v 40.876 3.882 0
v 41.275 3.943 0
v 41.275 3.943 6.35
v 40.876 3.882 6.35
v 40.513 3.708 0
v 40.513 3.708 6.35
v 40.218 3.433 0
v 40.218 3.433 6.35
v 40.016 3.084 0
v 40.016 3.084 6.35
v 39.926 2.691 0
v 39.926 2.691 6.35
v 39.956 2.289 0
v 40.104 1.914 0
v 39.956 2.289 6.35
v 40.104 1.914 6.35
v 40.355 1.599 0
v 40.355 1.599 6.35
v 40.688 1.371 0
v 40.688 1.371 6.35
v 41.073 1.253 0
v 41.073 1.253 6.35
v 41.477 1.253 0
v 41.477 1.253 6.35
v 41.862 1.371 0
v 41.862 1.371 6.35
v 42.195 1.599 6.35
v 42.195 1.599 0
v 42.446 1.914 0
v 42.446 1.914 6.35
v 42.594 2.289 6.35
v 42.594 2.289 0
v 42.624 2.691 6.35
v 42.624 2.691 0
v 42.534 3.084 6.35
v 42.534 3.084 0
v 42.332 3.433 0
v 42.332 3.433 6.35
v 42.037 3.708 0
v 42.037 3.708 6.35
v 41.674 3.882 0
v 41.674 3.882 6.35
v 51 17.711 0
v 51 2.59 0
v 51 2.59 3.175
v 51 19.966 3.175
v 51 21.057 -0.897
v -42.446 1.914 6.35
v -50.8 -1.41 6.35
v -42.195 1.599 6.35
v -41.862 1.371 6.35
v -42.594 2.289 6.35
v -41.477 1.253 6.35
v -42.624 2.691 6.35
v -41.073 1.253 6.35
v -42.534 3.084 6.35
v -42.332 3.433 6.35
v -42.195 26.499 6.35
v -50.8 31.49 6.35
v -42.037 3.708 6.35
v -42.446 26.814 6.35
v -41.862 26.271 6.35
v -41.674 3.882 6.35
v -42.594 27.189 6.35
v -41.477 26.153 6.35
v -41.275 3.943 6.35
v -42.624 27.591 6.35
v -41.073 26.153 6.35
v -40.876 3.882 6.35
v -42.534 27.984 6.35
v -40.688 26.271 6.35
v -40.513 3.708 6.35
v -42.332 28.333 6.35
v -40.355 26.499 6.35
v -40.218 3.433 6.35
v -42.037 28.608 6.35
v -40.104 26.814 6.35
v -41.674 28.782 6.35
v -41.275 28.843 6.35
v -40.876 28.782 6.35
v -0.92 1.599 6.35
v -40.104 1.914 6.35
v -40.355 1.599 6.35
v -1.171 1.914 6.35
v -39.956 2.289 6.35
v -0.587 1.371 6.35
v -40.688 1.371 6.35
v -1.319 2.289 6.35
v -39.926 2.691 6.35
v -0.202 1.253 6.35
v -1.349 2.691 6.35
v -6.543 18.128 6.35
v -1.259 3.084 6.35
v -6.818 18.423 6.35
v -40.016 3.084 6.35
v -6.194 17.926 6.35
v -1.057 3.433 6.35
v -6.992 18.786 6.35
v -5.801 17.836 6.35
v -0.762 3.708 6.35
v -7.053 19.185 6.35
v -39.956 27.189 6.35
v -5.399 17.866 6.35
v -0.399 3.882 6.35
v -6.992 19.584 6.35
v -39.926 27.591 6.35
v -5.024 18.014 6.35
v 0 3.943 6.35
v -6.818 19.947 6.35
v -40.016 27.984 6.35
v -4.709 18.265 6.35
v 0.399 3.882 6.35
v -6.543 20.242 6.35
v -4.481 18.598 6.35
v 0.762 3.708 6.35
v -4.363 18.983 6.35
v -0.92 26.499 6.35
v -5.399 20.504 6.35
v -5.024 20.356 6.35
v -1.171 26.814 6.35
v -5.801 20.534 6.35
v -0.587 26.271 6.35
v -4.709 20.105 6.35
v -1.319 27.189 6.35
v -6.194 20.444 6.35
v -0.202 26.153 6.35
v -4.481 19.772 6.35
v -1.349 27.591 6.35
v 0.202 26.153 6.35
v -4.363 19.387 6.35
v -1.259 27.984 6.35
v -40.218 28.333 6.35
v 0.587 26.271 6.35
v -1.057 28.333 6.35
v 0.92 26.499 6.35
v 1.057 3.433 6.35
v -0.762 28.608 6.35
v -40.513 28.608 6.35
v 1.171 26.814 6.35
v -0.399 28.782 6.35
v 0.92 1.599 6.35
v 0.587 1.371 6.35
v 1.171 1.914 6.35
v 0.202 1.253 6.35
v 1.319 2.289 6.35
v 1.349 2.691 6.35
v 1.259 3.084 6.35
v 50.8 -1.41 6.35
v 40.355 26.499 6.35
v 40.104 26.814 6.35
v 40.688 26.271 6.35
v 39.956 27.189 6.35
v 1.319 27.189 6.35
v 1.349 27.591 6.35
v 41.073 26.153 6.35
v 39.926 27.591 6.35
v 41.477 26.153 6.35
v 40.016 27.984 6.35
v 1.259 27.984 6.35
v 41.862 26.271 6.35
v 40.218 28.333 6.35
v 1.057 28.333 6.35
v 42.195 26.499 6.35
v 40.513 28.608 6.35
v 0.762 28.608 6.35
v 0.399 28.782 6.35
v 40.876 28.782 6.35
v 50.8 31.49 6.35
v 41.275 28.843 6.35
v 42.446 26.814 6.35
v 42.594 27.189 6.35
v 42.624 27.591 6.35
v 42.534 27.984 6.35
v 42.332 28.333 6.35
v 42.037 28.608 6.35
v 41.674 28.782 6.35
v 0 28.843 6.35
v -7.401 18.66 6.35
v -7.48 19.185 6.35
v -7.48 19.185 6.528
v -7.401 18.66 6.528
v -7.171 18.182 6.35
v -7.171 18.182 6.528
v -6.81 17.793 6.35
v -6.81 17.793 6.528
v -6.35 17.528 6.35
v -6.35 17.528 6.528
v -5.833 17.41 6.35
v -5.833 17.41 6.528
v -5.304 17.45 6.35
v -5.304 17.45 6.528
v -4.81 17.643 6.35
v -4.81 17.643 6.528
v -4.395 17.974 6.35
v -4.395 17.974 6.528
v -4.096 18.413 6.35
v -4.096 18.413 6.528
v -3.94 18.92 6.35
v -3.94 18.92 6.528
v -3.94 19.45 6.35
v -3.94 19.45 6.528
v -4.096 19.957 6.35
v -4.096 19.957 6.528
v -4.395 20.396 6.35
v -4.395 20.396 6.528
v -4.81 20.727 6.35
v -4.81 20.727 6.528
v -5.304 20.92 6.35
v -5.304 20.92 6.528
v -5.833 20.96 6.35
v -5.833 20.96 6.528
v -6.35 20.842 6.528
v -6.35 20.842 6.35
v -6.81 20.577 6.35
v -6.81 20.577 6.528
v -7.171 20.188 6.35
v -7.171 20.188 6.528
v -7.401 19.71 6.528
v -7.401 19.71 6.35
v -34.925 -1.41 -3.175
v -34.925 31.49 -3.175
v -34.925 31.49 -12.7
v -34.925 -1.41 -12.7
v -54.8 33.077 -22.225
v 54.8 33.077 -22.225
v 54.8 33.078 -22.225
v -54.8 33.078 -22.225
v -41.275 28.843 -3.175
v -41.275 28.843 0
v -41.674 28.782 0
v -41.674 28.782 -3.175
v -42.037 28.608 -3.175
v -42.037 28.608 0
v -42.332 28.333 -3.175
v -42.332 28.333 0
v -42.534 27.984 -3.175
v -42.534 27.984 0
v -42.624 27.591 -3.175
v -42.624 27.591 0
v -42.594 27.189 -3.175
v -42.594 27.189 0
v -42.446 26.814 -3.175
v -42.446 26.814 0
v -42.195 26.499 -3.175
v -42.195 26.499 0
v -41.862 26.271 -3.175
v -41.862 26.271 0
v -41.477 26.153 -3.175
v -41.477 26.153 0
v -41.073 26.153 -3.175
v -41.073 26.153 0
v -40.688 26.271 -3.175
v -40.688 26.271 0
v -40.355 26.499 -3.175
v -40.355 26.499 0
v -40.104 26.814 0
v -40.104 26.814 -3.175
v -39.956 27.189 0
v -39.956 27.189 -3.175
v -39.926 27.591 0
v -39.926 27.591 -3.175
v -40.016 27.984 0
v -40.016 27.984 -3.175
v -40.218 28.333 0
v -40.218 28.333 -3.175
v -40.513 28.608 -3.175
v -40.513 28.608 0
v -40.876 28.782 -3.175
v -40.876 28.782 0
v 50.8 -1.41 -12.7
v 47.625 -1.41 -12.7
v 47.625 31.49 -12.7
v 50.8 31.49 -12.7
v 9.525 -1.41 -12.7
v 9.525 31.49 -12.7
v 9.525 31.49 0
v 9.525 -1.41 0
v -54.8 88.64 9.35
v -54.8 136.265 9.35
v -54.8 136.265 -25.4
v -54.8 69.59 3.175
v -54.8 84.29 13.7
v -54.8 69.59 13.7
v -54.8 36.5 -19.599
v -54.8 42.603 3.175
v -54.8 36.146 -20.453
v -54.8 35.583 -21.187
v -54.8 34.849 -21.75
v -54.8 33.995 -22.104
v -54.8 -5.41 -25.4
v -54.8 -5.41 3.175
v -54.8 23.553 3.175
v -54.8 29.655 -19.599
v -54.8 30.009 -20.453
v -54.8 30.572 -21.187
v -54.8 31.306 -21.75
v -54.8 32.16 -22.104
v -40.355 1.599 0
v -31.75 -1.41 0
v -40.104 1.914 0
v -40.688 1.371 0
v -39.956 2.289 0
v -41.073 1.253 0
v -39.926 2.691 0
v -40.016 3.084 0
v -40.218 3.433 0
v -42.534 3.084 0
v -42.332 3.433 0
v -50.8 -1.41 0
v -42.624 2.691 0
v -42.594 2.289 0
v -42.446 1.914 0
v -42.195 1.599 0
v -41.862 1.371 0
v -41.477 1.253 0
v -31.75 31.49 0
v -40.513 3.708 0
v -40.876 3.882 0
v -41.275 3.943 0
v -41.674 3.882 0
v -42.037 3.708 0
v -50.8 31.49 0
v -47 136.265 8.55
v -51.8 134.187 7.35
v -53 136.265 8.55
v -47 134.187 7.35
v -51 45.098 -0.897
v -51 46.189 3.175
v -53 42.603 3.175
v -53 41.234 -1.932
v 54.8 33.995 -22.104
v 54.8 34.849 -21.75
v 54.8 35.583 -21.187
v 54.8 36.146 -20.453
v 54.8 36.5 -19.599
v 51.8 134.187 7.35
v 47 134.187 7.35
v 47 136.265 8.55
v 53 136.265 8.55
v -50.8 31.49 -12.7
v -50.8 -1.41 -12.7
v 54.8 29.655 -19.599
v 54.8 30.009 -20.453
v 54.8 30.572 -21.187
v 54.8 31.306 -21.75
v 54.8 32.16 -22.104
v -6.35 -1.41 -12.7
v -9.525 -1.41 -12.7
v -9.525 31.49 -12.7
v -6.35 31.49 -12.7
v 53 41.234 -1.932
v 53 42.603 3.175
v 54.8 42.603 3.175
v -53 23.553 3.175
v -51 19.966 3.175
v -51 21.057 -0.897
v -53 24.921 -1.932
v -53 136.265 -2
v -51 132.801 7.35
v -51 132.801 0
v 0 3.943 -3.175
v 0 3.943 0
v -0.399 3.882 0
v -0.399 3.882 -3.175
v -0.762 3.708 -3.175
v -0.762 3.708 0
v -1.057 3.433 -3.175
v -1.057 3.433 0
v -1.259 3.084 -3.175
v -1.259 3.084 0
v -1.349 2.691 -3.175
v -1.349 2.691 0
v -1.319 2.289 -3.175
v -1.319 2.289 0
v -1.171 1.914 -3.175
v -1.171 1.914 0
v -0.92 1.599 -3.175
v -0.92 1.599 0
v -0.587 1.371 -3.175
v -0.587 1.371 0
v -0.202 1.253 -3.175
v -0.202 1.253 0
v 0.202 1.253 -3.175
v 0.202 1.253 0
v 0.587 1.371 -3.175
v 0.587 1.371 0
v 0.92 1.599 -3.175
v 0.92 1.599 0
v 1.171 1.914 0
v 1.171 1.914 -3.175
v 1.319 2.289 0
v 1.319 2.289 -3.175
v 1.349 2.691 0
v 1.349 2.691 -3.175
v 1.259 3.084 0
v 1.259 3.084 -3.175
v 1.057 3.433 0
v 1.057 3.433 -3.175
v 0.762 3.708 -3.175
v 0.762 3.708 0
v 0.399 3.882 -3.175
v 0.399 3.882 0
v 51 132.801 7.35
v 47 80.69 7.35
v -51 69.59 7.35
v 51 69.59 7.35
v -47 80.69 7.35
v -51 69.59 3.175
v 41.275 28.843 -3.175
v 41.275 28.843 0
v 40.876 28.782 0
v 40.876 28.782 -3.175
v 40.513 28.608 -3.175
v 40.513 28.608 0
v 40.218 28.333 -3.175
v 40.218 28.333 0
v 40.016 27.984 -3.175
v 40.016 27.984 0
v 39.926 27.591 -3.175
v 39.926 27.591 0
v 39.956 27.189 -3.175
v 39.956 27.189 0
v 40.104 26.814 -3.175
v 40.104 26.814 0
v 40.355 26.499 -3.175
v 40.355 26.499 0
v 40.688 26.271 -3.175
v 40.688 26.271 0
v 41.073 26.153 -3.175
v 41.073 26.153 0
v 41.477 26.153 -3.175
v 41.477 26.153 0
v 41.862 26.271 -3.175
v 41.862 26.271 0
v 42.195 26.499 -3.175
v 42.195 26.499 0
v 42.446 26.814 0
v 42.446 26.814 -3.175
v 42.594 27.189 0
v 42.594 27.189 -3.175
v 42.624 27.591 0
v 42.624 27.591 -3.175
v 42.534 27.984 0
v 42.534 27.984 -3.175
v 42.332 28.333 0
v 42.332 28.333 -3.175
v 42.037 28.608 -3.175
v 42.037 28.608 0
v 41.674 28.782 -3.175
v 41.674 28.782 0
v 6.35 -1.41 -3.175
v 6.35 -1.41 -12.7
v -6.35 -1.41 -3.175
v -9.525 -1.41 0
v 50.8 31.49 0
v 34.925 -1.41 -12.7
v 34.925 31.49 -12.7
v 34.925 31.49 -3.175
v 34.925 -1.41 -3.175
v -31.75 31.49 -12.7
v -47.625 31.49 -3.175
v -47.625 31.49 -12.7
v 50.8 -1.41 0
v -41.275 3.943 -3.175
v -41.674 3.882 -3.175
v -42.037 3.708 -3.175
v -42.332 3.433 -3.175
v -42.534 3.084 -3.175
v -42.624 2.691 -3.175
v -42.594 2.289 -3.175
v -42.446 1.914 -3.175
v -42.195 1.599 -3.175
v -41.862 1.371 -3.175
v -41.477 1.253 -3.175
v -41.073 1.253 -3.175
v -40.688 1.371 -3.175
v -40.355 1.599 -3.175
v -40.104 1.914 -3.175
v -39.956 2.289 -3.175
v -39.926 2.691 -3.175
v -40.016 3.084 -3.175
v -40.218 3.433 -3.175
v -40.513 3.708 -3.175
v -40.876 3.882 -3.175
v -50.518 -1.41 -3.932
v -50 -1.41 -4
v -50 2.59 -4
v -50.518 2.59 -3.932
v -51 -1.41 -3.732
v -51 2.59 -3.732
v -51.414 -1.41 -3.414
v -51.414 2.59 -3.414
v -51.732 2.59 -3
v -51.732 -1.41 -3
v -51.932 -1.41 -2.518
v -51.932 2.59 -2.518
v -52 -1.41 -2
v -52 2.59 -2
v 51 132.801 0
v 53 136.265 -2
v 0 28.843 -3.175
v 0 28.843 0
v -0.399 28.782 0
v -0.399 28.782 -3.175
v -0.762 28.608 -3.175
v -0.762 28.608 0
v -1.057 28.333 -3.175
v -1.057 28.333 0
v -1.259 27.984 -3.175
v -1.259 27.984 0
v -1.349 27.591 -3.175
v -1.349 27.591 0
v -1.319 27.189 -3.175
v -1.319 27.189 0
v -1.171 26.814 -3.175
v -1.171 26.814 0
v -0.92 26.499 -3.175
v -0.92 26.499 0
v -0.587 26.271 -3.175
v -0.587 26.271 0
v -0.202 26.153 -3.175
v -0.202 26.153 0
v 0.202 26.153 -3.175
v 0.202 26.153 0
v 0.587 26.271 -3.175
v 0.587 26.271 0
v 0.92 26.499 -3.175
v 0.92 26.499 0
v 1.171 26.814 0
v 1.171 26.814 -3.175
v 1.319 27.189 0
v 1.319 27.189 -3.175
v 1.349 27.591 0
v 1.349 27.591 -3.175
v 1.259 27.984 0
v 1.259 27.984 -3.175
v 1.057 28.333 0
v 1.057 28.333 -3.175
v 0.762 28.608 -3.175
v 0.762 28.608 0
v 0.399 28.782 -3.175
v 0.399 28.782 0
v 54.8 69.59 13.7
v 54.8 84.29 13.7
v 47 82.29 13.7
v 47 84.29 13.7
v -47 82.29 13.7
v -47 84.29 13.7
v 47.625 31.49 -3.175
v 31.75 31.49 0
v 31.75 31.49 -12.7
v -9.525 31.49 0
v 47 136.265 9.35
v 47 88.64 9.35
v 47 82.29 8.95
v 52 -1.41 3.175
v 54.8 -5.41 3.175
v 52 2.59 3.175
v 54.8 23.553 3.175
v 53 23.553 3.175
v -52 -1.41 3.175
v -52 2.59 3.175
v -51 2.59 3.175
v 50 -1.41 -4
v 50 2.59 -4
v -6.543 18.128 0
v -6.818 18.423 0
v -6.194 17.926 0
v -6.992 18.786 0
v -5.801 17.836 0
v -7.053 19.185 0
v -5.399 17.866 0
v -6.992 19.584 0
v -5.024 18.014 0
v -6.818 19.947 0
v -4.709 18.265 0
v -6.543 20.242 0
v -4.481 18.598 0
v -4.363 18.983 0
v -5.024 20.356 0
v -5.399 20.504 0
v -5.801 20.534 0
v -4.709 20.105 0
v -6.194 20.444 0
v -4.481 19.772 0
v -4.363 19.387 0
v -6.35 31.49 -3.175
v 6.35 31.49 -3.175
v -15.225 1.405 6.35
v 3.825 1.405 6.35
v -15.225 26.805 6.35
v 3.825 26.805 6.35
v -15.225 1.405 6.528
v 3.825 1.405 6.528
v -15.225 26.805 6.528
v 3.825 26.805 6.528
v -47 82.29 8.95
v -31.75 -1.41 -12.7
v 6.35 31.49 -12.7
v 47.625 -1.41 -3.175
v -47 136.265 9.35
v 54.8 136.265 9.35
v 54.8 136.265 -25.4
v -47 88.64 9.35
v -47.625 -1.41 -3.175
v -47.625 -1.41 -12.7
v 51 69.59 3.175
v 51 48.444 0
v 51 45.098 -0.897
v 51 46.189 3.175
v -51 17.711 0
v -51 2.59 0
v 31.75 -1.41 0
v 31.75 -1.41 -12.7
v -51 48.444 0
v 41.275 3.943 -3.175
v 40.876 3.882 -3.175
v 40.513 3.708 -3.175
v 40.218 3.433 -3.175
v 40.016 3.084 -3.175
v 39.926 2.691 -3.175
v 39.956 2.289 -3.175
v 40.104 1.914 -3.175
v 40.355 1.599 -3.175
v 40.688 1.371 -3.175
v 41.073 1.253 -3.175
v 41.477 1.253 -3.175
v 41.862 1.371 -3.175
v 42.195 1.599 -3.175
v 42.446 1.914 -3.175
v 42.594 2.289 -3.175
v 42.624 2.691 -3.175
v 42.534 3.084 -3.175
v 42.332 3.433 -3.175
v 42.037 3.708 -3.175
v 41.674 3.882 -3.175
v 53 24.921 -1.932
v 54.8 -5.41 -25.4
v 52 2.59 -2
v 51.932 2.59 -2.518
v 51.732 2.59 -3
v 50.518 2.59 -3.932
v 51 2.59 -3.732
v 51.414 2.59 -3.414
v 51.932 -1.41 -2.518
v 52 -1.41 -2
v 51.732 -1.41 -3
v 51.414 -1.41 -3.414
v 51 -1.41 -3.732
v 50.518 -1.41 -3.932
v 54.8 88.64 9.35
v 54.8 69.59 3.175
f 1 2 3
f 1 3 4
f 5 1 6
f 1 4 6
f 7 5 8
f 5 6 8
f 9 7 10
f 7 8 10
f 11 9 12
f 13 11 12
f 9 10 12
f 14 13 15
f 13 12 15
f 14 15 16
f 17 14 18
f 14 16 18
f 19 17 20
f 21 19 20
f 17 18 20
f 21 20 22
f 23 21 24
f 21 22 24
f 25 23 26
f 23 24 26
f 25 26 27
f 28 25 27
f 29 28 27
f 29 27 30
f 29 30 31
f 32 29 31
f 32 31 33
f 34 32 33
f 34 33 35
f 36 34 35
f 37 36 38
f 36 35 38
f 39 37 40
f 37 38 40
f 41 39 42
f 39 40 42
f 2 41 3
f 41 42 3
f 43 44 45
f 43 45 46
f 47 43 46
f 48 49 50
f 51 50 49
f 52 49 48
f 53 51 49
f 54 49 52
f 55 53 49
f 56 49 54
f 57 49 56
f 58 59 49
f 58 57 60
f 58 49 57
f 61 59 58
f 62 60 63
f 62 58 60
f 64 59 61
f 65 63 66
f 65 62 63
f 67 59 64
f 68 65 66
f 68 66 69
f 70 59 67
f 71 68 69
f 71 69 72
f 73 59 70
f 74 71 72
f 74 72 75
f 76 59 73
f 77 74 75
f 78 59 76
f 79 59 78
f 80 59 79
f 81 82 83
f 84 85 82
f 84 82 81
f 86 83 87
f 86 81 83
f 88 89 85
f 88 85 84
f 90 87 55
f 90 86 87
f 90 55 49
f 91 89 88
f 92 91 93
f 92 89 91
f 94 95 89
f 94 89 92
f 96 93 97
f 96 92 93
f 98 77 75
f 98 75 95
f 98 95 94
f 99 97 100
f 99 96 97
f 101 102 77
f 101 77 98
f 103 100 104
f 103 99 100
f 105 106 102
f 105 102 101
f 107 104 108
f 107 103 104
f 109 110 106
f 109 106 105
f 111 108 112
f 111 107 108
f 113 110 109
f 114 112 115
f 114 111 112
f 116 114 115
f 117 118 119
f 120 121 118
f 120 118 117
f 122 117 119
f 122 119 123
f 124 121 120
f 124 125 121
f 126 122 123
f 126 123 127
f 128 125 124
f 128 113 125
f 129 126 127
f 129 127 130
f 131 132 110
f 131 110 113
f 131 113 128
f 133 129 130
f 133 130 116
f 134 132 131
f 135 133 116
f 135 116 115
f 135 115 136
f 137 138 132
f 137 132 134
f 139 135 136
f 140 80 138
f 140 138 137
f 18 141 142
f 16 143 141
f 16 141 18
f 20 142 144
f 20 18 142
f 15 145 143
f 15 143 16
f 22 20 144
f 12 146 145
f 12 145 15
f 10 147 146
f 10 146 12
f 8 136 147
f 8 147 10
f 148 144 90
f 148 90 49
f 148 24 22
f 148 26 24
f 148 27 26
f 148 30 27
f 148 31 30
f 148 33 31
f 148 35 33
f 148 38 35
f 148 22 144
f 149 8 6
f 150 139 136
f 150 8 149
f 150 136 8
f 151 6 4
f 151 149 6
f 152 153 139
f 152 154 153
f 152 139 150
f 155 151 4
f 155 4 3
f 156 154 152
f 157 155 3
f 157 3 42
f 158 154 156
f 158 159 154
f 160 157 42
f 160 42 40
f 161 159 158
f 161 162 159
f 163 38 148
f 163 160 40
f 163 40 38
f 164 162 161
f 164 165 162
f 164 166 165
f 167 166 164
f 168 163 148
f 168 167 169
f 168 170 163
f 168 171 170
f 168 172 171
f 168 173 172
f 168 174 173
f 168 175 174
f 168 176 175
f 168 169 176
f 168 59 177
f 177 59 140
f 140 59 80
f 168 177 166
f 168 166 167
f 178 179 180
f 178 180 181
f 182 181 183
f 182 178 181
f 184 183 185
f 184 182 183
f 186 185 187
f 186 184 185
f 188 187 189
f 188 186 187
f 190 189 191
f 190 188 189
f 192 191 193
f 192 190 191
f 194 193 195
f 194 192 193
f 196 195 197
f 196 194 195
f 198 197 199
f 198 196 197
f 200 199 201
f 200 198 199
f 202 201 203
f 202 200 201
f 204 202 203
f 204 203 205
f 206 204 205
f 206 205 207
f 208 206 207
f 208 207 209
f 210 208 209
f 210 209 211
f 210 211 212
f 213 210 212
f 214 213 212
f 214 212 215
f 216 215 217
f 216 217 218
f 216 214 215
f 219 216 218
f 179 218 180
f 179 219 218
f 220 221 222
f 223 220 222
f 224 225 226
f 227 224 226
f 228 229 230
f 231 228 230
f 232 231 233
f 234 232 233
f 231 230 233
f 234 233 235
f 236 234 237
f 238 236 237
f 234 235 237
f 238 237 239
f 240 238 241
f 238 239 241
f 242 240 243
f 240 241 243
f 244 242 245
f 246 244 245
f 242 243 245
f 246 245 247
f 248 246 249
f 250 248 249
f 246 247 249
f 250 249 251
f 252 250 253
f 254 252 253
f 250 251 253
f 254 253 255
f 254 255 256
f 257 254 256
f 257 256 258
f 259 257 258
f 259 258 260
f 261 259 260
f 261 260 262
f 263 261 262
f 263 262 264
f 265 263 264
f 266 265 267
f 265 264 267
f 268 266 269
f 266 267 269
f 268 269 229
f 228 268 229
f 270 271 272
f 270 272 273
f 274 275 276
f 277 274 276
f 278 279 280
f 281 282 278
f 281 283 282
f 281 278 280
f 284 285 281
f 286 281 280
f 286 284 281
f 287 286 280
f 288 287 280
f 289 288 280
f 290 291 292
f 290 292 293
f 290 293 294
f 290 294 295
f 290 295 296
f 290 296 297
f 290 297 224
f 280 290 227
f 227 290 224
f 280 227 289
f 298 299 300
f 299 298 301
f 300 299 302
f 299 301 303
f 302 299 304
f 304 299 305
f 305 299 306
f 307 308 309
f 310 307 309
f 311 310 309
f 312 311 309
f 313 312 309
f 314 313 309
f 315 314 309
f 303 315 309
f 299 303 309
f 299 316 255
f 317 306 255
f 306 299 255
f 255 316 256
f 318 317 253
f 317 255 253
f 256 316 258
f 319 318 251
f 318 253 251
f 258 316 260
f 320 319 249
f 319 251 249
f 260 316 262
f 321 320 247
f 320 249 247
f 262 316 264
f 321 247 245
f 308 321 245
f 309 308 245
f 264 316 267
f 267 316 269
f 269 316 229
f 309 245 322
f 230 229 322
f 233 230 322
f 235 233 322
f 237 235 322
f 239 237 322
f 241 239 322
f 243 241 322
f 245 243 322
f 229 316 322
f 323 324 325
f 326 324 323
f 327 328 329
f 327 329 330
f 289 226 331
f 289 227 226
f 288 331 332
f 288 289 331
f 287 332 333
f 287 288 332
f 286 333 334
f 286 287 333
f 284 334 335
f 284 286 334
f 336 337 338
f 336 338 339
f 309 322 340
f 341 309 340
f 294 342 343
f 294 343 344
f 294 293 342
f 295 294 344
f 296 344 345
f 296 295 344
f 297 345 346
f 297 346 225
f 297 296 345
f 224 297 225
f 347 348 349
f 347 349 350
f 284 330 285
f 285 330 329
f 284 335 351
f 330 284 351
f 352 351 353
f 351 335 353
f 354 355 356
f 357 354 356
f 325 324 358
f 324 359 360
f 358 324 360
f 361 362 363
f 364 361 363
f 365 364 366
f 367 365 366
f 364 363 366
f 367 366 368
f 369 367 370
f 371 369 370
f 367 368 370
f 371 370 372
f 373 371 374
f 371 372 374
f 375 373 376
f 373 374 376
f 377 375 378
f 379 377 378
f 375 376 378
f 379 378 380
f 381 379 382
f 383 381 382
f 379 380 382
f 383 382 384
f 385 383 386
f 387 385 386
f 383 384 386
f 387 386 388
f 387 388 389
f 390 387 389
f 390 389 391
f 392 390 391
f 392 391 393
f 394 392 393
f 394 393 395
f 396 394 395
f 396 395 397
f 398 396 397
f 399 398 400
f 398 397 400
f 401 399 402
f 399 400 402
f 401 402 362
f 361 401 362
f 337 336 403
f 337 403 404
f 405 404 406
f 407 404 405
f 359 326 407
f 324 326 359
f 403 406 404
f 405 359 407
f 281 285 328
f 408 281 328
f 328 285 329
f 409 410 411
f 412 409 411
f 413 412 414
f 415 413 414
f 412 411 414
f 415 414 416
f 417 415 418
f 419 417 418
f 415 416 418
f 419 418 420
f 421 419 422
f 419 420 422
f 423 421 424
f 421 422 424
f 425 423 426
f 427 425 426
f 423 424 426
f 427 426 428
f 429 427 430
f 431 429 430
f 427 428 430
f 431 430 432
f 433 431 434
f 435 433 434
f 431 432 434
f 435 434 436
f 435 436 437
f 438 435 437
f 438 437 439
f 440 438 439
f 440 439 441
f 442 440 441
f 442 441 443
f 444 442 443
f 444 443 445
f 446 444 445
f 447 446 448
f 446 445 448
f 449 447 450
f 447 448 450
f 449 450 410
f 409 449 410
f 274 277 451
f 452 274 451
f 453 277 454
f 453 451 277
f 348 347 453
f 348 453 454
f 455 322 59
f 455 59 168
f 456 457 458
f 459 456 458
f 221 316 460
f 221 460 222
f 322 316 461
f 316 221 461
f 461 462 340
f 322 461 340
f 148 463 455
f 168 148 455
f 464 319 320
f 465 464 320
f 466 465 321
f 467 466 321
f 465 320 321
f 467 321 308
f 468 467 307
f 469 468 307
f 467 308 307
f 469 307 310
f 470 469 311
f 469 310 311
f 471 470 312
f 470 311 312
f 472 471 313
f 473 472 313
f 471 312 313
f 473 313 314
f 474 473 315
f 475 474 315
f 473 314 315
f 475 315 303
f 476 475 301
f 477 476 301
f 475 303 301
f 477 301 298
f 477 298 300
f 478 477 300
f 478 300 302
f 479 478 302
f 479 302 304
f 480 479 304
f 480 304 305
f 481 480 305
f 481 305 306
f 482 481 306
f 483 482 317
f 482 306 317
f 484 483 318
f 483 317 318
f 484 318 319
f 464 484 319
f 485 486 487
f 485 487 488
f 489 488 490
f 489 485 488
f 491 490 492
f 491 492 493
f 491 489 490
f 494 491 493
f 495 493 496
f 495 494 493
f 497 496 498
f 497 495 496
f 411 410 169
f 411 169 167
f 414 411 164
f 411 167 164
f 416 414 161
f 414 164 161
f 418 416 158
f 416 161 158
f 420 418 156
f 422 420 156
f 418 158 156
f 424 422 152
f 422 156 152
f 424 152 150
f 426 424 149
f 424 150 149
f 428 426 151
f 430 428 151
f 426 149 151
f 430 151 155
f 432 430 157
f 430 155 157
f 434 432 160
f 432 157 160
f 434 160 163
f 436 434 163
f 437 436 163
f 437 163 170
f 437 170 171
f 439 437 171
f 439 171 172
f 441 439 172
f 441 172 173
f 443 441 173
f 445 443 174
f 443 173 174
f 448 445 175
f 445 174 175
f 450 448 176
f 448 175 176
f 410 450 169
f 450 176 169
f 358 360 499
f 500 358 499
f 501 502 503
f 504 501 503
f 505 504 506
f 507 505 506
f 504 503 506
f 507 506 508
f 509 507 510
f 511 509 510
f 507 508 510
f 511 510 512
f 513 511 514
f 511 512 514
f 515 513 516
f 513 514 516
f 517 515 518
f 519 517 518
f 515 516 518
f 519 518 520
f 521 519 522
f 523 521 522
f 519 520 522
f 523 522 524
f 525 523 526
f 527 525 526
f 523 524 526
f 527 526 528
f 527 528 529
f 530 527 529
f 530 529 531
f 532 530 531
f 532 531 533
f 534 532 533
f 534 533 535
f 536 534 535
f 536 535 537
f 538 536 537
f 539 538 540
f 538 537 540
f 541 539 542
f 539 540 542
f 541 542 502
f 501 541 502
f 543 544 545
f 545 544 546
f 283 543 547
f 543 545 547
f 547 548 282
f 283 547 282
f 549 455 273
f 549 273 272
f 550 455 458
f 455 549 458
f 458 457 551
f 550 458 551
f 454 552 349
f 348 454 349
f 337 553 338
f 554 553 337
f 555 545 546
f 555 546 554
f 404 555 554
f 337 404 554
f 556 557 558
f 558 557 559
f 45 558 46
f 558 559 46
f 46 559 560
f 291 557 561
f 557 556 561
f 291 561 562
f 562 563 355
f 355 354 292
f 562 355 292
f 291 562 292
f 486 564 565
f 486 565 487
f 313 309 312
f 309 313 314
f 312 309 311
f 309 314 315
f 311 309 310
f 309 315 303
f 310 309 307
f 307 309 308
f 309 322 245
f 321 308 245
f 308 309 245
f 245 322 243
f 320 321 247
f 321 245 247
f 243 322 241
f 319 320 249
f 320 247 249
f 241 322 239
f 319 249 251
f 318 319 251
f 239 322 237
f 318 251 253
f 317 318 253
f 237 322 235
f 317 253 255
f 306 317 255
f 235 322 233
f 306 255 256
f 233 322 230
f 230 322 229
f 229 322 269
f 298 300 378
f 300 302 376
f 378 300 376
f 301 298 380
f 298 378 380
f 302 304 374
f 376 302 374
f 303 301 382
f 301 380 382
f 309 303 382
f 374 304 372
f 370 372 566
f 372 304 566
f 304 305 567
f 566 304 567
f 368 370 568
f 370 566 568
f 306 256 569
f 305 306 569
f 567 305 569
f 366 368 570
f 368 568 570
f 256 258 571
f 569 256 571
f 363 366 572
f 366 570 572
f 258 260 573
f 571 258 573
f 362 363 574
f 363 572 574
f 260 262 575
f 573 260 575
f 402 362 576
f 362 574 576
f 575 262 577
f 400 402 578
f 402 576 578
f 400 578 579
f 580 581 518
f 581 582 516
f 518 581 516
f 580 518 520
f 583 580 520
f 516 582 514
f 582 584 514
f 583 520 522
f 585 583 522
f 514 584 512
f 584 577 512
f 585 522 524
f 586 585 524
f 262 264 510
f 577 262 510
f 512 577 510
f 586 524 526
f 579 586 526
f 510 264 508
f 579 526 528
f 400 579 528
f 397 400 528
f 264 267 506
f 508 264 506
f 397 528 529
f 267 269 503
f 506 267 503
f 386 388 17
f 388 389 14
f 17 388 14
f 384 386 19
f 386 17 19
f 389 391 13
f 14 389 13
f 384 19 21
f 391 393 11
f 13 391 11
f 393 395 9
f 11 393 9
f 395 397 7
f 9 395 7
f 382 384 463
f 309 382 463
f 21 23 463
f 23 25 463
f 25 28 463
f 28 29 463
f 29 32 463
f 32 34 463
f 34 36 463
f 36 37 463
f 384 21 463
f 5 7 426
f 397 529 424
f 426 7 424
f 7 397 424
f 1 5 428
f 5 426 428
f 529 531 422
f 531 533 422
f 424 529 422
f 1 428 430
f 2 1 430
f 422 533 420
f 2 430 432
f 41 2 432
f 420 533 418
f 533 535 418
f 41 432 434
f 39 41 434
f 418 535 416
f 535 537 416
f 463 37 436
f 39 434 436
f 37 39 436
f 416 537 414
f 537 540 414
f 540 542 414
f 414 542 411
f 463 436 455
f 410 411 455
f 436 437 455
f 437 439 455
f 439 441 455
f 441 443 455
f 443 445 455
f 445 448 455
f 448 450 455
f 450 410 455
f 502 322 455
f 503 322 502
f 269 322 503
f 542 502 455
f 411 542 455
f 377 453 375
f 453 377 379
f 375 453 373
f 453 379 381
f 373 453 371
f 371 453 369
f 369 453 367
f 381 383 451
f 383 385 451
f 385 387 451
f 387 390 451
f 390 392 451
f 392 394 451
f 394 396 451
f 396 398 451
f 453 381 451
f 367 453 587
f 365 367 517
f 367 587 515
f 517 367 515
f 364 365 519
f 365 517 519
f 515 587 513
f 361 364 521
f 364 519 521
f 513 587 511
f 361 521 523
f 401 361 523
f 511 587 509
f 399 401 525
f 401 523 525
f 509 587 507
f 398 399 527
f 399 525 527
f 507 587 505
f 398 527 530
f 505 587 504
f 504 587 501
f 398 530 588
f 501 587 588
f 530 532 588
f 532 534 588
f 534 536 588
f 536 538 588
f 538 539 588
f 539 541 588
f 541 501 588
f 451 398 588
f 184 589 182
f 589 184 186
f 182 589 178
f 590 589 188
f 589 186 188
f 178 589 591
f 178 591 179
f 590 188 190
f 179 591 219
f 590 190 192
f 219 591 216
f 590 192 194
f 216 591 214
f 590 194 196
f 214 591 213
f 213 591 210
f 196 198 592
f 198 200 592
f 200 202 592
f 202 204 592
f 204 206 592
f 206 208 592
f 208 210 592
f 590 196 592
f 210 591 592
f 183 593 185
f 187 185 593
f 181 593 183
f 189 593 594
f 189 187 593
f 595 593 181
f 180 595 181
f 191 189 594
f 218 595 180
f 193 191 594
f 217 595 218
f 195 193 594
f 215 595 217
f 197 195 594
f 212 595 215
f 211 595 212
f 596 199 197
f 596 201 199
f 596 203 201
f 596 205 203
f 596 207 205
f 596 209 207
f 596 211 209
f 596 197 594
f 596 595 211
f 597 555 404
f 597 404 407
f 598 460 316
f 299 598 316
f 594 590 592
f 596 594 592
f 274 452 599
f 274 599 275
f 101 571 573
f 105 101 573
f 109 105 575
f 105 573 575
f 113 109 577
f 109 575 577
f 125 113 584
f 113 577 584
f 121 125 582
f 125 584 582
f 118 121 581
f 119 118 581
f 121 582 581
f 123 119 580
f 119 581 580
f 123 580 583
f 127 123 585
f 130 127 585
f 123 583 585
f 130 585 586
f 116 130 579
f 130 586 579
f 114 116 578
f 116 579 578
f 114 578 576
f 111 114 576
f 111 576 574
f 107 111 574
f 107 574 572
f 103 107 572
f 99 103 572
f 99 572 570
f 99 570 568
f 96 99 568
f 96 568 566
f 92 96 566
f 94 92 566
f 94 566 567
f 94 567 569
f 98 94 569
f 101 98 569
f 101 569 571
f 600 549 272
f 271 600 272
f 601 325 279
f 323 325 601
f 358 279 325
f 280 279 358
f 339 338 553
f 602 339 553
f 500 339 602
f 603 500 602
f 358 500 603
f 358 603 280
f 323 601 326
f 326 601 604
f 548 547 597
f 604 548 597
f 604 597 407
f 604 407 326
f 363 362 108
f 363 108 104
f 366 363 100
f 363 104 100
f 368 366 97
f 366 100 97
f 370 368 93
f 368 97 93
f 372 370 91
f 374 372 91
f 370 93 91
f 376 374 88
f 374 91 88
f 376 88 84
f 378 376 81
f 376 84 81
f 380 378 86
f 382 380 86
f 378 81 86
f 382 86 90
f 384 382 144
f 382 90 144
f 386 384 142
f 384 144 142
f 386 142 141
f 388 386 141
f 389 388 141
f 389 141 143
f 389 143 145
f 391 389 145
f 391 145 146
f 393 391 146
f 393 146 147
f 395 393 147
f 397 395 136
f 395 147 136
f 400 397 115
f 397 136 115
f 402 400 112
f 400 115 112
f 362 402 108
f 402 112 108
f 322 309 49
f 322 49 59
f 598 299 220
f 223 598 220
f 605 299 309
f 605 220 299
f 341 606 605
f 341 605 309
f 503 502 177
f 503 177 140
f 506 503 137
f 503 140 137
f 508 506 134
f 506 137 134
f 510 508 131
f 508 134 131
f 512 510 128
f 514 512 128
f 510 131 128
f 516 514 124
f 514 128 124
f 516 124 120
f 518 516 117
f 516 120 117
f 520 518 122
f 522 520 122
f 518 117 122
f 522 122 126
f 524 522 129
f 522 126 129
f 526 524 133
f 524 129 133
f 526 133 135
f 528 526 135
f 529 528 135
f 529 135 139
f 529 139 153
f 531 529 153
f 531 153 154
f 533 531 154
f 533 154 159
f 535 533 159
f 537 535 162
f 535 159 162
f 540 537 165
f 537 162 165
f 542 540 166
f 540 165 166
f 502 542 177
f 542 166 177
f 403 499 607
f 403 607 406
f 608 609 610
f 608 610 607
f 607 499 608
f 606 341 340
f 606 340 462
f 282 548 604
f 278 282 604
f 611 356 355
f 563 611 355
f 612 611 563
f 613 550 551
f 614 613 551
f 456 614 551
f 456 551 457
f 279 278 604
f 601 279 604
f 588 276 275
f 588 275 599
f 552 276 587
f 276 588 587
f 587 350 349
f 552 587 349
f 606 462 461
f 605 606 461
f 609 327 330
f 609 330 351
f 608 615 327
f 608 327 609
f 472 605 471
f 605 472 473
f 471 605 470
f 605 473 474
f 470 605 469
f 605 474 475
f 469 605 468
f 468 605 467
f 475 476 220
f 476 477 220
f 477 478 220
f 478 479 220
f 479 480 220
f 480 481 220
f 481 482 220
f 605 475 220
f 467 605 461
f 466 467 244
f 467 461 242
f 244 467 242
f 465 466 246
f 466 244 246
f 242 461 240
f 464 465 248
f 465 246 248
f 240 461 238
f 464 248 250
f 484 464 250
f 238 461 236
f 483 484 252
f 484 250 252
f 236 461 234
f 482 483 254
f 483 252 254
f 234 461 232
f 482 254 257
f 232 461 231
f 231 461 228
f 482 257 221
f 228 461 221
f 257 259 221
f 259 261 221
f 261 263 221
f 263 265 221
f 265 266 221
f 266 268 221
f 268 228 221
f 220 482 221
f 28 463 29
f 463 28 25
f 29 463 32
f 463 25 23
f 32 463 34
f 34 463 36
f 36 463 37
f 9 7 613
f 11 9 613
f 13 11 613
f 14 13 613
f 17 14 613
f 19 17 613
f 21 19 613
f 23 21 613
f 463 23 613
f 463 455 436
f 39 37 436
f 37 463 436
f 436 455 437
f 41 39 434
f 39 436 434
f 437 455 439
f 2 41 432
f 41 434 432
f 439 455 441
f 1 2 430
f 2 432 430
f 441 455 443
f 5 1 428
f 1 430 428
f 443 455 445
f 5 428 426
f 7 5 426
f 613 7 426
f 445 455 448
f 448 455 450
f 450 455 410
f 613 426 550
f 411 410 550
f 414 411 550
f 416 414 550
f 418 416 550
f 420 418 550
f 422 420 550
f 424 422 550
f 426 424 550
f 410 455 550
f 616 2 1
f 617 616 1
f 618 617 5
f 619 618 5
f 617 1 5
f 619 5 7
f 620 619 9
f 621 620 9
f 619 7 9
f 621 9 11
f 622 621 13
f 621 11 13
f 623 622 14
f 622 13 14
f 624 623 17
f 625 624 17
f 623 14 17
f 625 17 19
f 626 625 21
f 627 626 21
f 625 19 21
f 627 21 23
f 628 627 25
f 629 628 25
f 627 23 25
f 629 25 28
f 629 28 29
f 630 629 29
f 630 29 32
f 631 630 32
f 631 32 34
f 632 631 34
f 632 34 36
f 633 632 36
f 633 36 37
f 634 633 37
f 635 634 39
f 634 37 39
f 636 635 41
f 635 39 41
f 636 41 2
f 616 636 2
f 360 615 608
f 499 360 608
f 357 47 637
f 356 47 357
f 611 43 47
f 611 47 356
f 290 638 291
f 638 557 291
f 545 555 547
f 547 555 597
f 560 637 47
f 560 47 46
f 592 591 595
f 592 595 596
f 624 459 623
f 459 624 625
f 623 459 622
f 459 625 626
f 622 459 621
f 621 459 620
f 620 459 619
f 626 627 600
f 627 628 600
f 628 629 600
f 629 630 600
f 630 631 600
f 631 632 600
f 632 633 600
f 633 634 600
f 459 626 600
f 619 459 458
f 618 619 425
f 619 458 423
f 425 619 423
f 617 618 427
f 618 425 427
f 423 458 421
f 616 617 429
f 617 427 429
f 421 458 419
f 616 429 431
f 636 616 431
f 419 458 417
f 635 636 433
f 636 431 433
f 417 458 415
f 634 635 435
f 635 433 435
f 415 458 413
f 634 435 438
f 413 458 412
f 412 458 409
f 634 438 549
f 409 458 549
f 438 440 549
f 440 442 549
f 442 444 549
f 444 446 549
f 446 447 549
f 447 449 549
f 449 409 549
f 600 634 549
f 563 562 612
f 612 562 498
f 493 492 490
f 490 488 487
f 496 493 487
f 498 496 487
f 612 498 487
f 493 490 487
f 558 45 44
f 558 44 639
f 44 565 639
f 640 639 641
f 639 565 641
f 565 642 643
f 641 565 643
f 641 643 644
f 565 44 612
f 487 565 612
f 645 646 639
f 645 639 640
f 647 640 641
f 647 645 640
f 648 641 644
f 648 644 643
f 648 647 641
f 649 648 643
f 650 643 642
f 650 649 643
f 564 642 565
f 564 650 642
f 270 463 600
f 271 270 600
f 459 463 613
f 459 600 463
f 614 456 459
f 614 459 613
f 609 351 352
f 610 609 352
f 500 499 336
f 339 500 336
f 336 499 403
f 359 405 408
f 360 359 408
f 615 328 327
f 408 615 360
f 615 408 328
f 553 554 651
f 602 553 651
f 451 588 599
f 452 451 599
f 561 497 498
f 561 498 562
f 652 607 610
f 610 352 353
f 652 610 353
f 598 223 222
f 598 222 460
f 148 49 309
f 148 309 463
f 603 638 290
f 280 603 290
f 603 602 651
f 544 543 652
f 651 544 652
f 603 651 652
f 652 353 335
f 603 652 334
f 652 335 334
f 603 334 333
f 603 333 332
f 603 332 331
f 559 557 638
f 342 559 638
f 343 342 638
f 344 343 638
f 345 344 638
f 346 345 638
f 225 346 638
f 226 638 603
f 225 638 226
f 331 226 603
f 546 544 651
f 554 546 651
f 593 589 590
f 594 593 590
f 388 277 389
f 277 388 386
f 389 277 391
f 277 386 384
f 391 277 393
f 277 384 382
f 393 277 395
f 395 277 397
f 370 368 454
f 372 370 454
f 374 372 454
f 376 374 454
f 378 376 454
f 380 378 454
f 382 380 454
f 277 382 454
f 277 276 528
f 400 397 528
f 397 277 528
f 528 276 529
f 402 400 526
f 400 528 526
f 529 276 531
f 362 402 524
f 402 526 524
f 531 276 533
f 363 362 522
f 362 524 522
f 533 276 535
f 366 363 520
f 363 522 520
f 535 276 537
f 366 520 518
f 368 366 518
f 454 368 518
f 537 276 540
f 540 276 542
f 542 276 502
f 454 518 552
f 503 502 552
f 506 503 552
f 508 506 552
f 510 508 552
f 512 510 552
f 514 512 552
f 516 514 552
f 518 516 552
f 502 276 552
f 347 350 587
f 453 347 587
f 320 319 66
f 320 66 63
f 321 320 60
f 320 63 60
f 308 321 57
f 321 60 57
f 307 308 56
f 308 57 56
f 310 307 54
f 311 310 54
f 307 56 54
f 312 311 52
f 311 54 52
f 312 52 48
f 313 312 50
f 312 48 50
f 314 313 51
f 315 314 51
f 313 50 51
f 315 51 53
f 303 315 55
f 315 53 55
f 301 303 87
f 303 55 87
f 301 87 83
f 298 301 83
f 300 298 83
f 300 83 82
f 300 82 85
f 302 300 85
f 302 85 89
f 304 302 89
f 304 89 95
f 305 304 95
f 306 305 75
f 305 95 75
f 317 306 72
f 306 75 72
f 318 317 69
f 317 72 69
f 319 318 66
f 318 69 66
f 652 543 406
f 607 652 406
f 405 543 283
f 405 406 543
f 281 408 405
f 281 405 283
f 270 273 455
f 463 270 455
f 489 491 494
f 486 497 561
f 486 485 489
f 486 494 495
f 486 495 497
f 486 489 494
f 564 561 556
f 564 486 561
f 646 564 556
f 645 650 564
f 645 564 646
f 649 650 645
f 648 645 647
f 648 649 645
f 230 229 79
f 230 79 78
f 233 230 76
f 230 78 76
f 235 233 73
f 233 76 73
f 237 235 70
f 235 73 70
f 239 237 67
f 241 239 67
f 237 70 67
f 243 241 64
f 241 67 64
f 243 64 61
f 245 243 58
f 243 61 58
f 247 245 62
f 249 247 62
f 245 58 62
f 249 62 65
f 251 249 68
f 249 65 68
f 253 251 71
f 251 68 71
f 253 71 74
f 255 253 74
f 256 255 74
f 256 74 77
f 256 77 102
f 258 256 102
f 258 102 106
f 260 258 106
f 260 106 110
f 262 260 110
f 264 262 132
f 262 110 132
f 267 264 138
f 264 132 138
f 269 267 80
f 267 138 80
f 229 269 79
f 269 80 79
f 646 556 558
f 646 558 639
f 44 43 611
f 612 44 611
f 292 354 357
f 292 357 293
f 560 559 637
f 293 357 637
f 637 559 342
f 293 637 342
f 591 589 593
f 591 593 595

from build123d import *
from OCP.BRepFilletAPI import BRepFilletAPI_MakeChamfer

# Parameters (mm, degrees)
SKETCH1_W                          = 101.6
SKETCH1_H                          = 35.999999882
BOSS_EXTRUDE1_DEPTH                = 6.35
TAP_DRILL_FOR_6_32_TAP2_D          = 2.7051
SKETCH5_W                          = 16.399999966
SKETCH5_H                          = 3.000000096
CUT_EXTRUDE1_DEPTH                 = 61.104763545
MOVE_FACE1_BY                      = 0.100000054
MOVE_FACE1_2_BY                    = 0.100000054
MOVE_FACE1_3_BY                    = 0.100000054
MOVE_FACE1_4_BY                    = 0.100000054
SKETCH4_W                          = 19.05
SKETCH4_H                          = 25.4
SKETCH4_R                          = 1.78
BOSS_EXTRUDE2_DEPTH                = 0.178
BOSS_EXTRUDE3_DEPTH                = 32.899999732
LPATTERN1_COUNT                    = 3
LPATTERN1_PITCH                    = 41.275
SKETCH7_W                          = 101.6
SKETCH7_H                          = 3.10000015
CUT_EXTRUDE2_DEPTH                 = 63.730874382
SKETCH9_W                          = 1.35255
SKETCH9_H                          = 9.703
TAP_DRILL_FOR_6_32_TAP3_AT_2_COUNT = 2
TAP_DRILL_FOR_6_32_TAP3_AT_2_PITCH = 24.899999476
TAP_DRILL_FOR_6_32_TAP3_AT_3_COUNT = 2
TAP_DRILL_FOR_6_32_TAP3_AT_3_PITCH = 41.275
TAP_DRILL_FOR_6_32_TAP3_AT_4_COUNT = 2
TAP_DRILL_FOR_6_32_TAP3_AT_4_PITCH = 48.204103548
TAP_DRILL_FOR_6_32_TAP3_AT_5_COUNT = 2
TAP_DRILL_FOR_6_32_TAP3_AT_5_PITCH = 82.55
TAP_DRILL_FOR_6_32_TAP3_AT_6_COUNT = 2
TAP_DRILL_FOR_6_32_TAP3_AT_6_PITCH = 86.223619003
SKETCH15_W                         = 109.600000256
SKETCH15_H                         = 36.89999986
BOSS_EXTRUDE6_DEPTH                = 1.600000102
BOSS_EXTRUDE7_DEPTH                = 3.175
MOVE_FACE3_BY                      = 0.200000108
MOVE_FACE3_2_BY                    = 0.200000108
BOSS_EXTRUDE8_DEPTH                = 101.6
SKETCH18_W                         = 109.600000256
SKETCH18_H                         = 141.67499986
BOSS_EXTRUDE9_DEPTH                = 23.799999898
CUT_EXTRUDE5_DEPTH                 = 177.707301163
FILLET1_R                          = 3.543588
BOSS_EXTRUDE10_DEPTH               = 66.675
SKETCH21_W                         = 109.600000256
SKETCH21_H                         = 12.7
BOSS_EXTRUDE11_DEPTH               = 6.35
CHAMFER2_SIZE                      = 1.6
CHAMFER4_SIZE                      = 2
CHAMFER4_SIZE2                     = 3.464101615
CHAMFER4_SIZE2_2                   = 6.69213043
CHAMFER5_SIZE                      = 2
CHAMFER5_SIZE2                     = 3.464101615
CHAMFER6_SIZE                      = 1.2
CHAMFER6_SIZE2                     = 2.078460969
CHAMFER7_SIZE                      = 6.35
CUT_EXTRUDE6_DEPTH                 = 4.000000128


# Some blends are built 0.0001 mm under size
with BuildPart() as part:
    # Sketch1 → Boss-Extrude1 (new body)
    with BuildSketch(Plane.XY):
        with Locations((0, 13.490000071)):
            Rectangle(SKETCH1_W, SKETCH1_H)
    extrude(amount=BOSS_EXTRUDE1_DEPTH)

    # Tap Drill for #6-32 Tap2 (through all)
    with Locations(Plane.XY.offset(6.35)):
        with Locations((-5.70000003, 19.184999984)):
            Hole(TAP_DRILL_FOR_6_32_TAP2_D / 2)

    # Sketch5 → Cut-Extrude1 (cut, through all)
    with BuildSketch(Plane.XY.offset(6.35)):
        with Locations((42.600000017, -3.009999822)):
            Rectangle(SKETCH5_W, SKETCH5_H)
        with Locations((-42.600000017, -3.009999822)):
            Rectangle(SKETCH5_W, SKETCH5_H)
    extrude(amount=-CUT_EXTRUDE1_DEPTH, mode=Mode.SUBTRACT)

    # Move Face1: a face moved inward by 0.1
    extrude(part.faces().sort_by_distance((-42.600000017, -1.509999774, 3.175))[0], amount=MOVE_FACE1_BY, dir=(0, 1, 0), mode=Mode.SUBTRACT)

    # Move Face1 2: a face moved inward by 0.1
    extrude(part.faces().sort_by_distance((-34.400000034, -3.009999822, 3.175))[0], amount=MOVE_FACE1_2_BY, dir=(1, 0, 0), mode=Mode.SUBTRACT)

    # Move Face1 3: a face moved inward by 0.1
    extrude(part.faces().sort_by_distance((34.400000034, -3.009999822, 3.175))[0], amount=MOVE_FACE1_3_BY, dir=(-1, 0, 0), mode=Mode.SUBTRACT)

    # Move Face1 4: a face moved inward by 0.1
    extrude(part.faces().sort_by_distance((42.600000017, -1.509999774, 3.175))[0], amount=MOVE_FACE1_4_BY, dir=(0, 1, 0), mode=Mode.SUBTRACT)

    # Sketch7 → Cut-Extrude2 (cut, through all)
    with BuildSketch(Plane.XY.offset(6.35)):
        with Locations((0, -2.959999795)):
            Rectangle(SKETCH7_W, SKETCH7_H)
    extrude(amount=-CUT_EXTRUDE2_DEPTH, mode=Mode.SUBTRACT)


with BuildPart() as body_2:
    # Sketch4 → Boss-Extrude2 (new body)
    with BuildSketch(Plane.XY.offset(6.35)):
        with Locations((-5.70000003, 14.104999984)):
            Rectangle(SKETCH4_W, SKETCH4_H)
        with Locations(Location((-5.70000003, 19.184999984, 0), (0, 0, 180))):
            Circle(SKETCH4_R, mode=Mode.SUBTRACT)
    extrude(amount=BOSS_EXTRUDE2_DEPTH)


with BuildPart() as body_3:
    # Sketch6 → Boss-Extrude3 (new body)
    with BuildSketch(Plane(origin=(0, 31.490000012, 0), x_dir=(1, 0, 0), z_dir=(0, 1, 0))):
        Polygon((50.8, 12.7), (50.8, 0), (31.75, 0), (31.75, 12.7), (34.925, 12.7), (34.925, 3.175), (47.625, 3.175), (47.625, 12.7), align=None)
    extrude(amount=-BOSS_EXTRUDE3_DEPTH)


with BuildPart() as lpattern1_1:
    # LPattern1: pattern copy
    add(body_3.part.moved(Location(Vector(-1, 0, 0) * (1 * LPATTERN1_PITCH))))


with BuildPart() as lpattern1_2:
    # LPattern1: pattern copy
    add(body_3.part.moved(Location(Vector(-1, 0, 0) * (2 * LPATTERN1_PITCH))))


with BuildPart() as tap_drill_for_6_32_tap3_tool:
    # Sketch9 → Tap Drill for #6-32 Tap3 (revolve)
    with BuildSketch(Plane(origin=(41.275, 27.489999884, -3.175), x_dir=(0, 1, 0), z_dir=(1, 0, 0))):
        with Locations((0.676275, 4.8515)):
            Rectangle(SKETCH9_W, SKETCH9_H)
    tap_drill_for_6_32_tap3 = revolve(axis=Axis((41.275, 27.489999884, -9.525), (0, 0, 1)))


with BuildPart() as part_1:
    add(part.part)

    # Tap Drill for #6-32 Tap3: cut by tap_drill_for_6_32_tap3_tool
    add(tap_drill_for_6_32_tap3_tool.part, mode=Mode.SUBTRACT)


with BuildPart() as body_3_1:
    add(body_3.part)

    # Tap Drill for #6-32 Tap3: cut by tap_drill_for_6_32_tap3_tool
    add(tap_drill_for_6_32_tap3_tool.part, mode=Mode.SUBTRACT)


with BuildPart() as tap_drill_for_6_32_tap3_at_2_tool:
    # Tap Drill for #6-32 Tap3 at 2: Tap Drill for #6-32 Tap3 ×2
    with Locations(*[(0, -i * TAP_DRILL_FOR_6_32_TAP3_AT_2_PITCH, 0) for i in range(1, TAP_DRILL_FOR_6_32_TAP3_AT_2_COUNT)]):
        add(tap_drill_for_6_32_tap3)


with BuildPart() as part_2:
    add(part_1.part)

    # Tap Drill for #6-32 Tap3 at 2: cut by tap_drill_for_6_32_tap3_at_2_tool
    add(tap_drill_for_6_32_tap3_at_2_tool.part, mode=Mode.SUBTRACT)


with BuildPart() as body_3_2:
    add(body_3_1.part)

    # Tap Drill for #6-32 Tap3 at 2: cut by tap_drill_for_6_32_tap3_at_2_tool
    add(tap_drill_for_6_32_tap3_at_2_tool.part, mode=Mode.SUBTRACT)


with BuildPart() as tap_drill_for_6_32_tap3_at_3_tool:
    # Tap Drill for #6-32 Tap3 at 3: Tap Drill for #6-32 Tap3 ×2
    with Locations(*[(-i * TAP_DRILL_FOR_6_32_TAP3_AT_3_PITCH, 0, 0) for i in range(1, TAP_DRILL_FOR_6_32_TAP3_AT_3_COUNT)]):
        add(tap_drill_for_6_32_tap3)


with BuildPart() as part_3:
    add(part_2.part)

    # Tap Drill for #6-32 Tap3 at 3: cut by tap_drill_for_6_32_tap3_at_3_tool
    add(tap_drill_for_6_32_tap3_at_3_tool.part, mode=Mode.SUBTRACT)


with BuildPart() as lpattern1_1_1:
    add(lpattern1_1.part)

    # Tap Drill for #6-32 Tap3 at 3: cut by tap_drill_for_6_32_tap3_at_3_tool
    add(tap_drill_for_6_32_tap3_at_3_tool.part, mode=Mode.SUBTRACT)


with BuildPart() as tap_drill_for_6_32_tap3_at_4_tool:
    # Tap Drill for #6-32 Tap3 at 4: Tap Drill for #6-32 Tap3 ×2
    with Locations(*[Vector(-0.8562549028332803, -0.5165535222742845, 0) * (i * TAP_DRILL_FOR_6_32_TAP3_AT_4_PITCH) for i in range(1, TAP_DRILL_FOR_6_32_TAP3_AT_4_COUNT)]):
        add(tap_drill_for_6_32_tap3)


with BuildPart() as part_4:
    add(part_3.part)

    # Tap Drill for #6-32 Tap3 at 4: cut by tap_drill_for_6_32_tap3_at_4_tool
    add(tap_drill_for_6_32_tap3_at_4_tool.part, mode=Mode.SUBTRACT)


with BuildPart() as lpattern1_1_2:
    add(lpattern1_1_1.part)

    # Tap Drill for #6-32 Tap3 at 4: cut by tap_drill_for_6_32_tap3_at_4_tool
    add(tap_drill_for_6_32_tap3_at_4_tool.part, mode=Mode.SUBTRACT)


with BuildPart() as tap_drill_for_6_32_tap3_at_5_tool:
    # Tap Drill for #6-32 Tap3 at 5: Tap Drill for #6-32 Tap3 ×2
    with Locations(*[(-i * TAP_DRILL_FOR_6_32_TAP3_AT_5_PITCH, 0, 0) for i in range(1, TAP_DRILL_FOR_6_32_TAP3_AT_5_COUNT)]):
        add(tap_drill_for_6_32_tap3)


with BuildPart() as part_5:
    add(part_4.part)

    # Tap Drill for #6-32 Tap3 at 5: cut by tap_drill_for_6_32_tap3_at_5_tool
    add(tap_drill_for_6_32_tap3_at_5_tool.part, mode=Mode.SUBTRACT)


with BuildPart() as lpattern1_2_1:
    add(lpattern1_2.part)

    # Tap Drill for #6-32 Tap3 at 5: cut by tap_drill_for_6_32_tap3_at_5_tool
    add(tap_drill_for_6_32_tap3_at_5_tool.part, mode=Mode.SUBTRACT)


with BuildPart() as tap_drill_for_6_32_tap3_at_6_tool:
    # Tap Drill for #6-32 Tap3 at 6: Tap Drill for #6-32 Tap3 ×2
    with Locations(*[Vector(-0.9573942842449561, -0.28878397548182655, 0) * (i * TAP_DRILL_FOR_6_32_TAP3_AT_6_PITCH) for i in range(1, TAP_DRILL_FOR_6_32_TAP3_AT_6_COUNT)]):
        add(tap_drill_for_6_32_tap3)


with BuildPart() as part_6:
    add(part_5.part)

    # Tap Drill for #6-32 Tap3 at 6: cut by tap_drill_for_6_32_tap3_at_6_tool
    add(tap_drill_for_6_32_tap3_at_6_tool.part, mode=Mode.SUBTRACT)


with BuildPart() as lpattern1_2_2:
    add(lpattern1_2_1.part)

    # Tap Drill for #6-32 Tap3 at 6: cut by tap_drill_for_6_32_tap3_at_6_tool
    add(tap_drill_for_6_32_tap3_at_6_tool.part, mode=Mode.SUBTRACT)


with BuildPart() as body_6:
    # Sketch15 → Boss-Extrude6 (new body)
    with BuildSketch(Plane(origin=(0, 0, 0), x_dir=(-1, 0, 0), z_dir=(0, 0, -1))):
        with Locations((0, 13.040000082)):
            Rectangle(SKETCH15_W, SKETCH15_H)
    extrude(amount=BOSS_EXTRUDE6_DEPTH)

    # Sketch16 → Boss-Extrude7 (add)
    with BuildSketch(Plane.XY):
        Polygon((-50.8, 31.490000012), (-50.8, -1.40999972), (50.8, -1.40999972), (50.8, 31.490000012), (54.800000128, 31.490000012), (54.800000128, -5.409999848), (-54.800000128, -5.409999848), (-54.800000128, 31.490000012), align=None)
    extrude(amount=BOSS_EXTRUDE7_DEPTH)

    # Move Face3: a face moved inward by 0.2
    extrude(body_6.faces().sort_by_distance((50.8, 15.040000146, 1.5875))[0], amount=MOVE_FACE3_BY, dir=(1, 0, 0), mode=Mode.SUBTRACT)

    # Move Face3 2: a face moved inward by 0.2
    extrude(body_6.faces().sort_by_distance((-50.8, 15.040000146, 1.5875))[0], amount=MOVE_FACE3_2_BY, dir=(-1, 0, 0), mode=Mode.SUBTRACT)


with BuildPart() as body_7:
    # Sketch17 → Boss-Extrude8 (new body)
    with BuildSketch(Plane(origin=(0, 34.665000012, 0), x_dir=(1, 0, 0), z_dir=(0, 1, 0))):
        Polygon((54.800000128, -3.175), (54.800000128, 1.600000102), (-54.800000128, 1.600000102), (-54.800000128, -3.175), (-51.000000108, -3.175), (-51.000000108, 0), (51.000000108, 0), (51.000000108, -3.175), align=None)
    extrude(amount=BOSS_EXTRUDE8_DEPTH)


    add(body_6.part)  # Boss-Extrude9 merges body 6
    # Sketch18 → Boss-Extrude9 (add)
    with BuildSketch(Plane(origin=(0, 0, -1.600000102), x_dir=(-1, 0, 0), z_dir=(0, 0, -1))):
        with Locations((0, 65.427500082)):
            Rectangle(SKETCH18_W, SKETCH18_H)
    extrude(amount=BOSS_EXTRUDE9_DEPTH)

    # Sketch19 → Cut-Extrude5 (cut, through all)
    with BuildSketch(Plane(origin=(54.800000128, 0, 0), x_dir=(0, 0, -1), z_dir=(1, 0, 0))):
        Polygon((22.225, 35.796590524), (-3.175, 42.602500012), (-3.175, 23.552500012), (22.225, 30.3584095), align=None)
    extrude(amount=-CUT_EXTRUDE5_DEPTH, mode=Mode.SUBTRACT)

    # Fillet1
    fillet1_edges = [body_7.edges().sort_by_distance(p)[0] for p in [
        (0, 30.3584095, -22.225),
        (0, 35.796590524, -22.225),
    ]]
    fillet(fillet1_edges, radius=FILLET1_R - 0.0001)  # a hair under: the kernel refuses the full size

    # Sketch20 → Boss-Extrude10 (add)
    with BuildSketch(Plane(origin=(0, 69.590000012, 0), x_dir=(1, 0, 0), z_dir=(0, 1, 0))):
        Polygon((46.99999998, -9.350000096), (54.800000128, -9.350000096), (54.800000128, -3.175), (51.000000108, -3.175), (51.000000108, -7.350000032), (46.99999998, -7.350000032), align=None)
        Polygon((-54.800000128, -3.175), (-54.800000128, -9.350000096), (-46.99999998, -9.350000096), (-46.99999998, -7.350000032), (-51.000000108, -7.350000032), (-51.000000108, -3.175), align=None)
    extrude(amount=BOSS_EXTRUDE10_DEPTH)

    # Sketch21 → Boss-Extrude11 (add)
    with BuildSketch(Plane(origin=(0, 0, 7.350000032), x_dir=(-1, 0, 0), z_dir=(0, 0, -1))):
        with Locations((0, 75.940000012)):
            Rectangle(SKETCH21_W, SKETCH21_H)
    extrude(amount=-BOSS_EXTRUDE11_DEPTH)

    # Chamfer2
    chamfer2_edges = [body_7.edges().sort_by_distance(p)[0] for p in [
        (0, 82.290000012, 7.350000032),
    ]]
    chamfer(chamfer2_edges, length=CHAMFER2_SIZE)

    # Chamfer4: one chamfer whose edges measure the first distance from different faces: ONE call of the kernel's chamfer builder (chamfer() names one face for all edges)
    chamfer4_edges_1 = [body_7.edges().sort_by_distance(p)[0] for p in [
        (51.000000108, 42.177130669, 1.5875),
        (-51.000000108, 42.177130669, 1.5875),
    ]]
    chamfer4_side_1 = [body_7.faces().sort_by_distance(p)[0] for p in [
        (0, 39.159936336, -9.672822546),
    ]]
    chamfer4_edges_2 = [body_7.edges().sort_by_distance(p)[0] for p in [
        (0, 41.751761326, 0),
    ]]
    chamfer4_side_2 = [body_7.faces().sort_by_distance(p)[0] for p in [
        (0, 39.159936336, -9.672822546),
    ]]
    chamfer4_edges_3 = [body_7.edges().sort_by_distance(p)[0] for p in [
        (51.000000108, 23.977869355, 1.5875),
        (-51.000000108, 23.977869355, 1.5875),
    ]]
    chamfer4_side_3 = [body_7.faces().sort_by_distance(p)[0] for p in [
        (0, 26.995063688, -9.672822546),
    ]]
    chamfer4_edges_4 = [body_7.edges().sort_by_distance(p)[0] for p in [
        (0, 24.403238698, 0),
    ]]
    chamfer4_side_4 = [body_7.faces().sort_by_distance(p)[0] for p in [
        (0, 26.995063688, -9.672822546),
    ]]
    chamfer4 = BRepFilletAPI_MakeChamfer(body_7.part.solid().wrapped)
    for e in chamfer4_edges_1:
        chamfer4.Add(CHAMFER4_SIZE, CHAMFER4_SIZE2, e.wrapped, chamfer4_side_1[0].wrapped)  # the first distance lies on this face
    for e in chamfer4_edges_2:
        chamfer4.Add(CHAMFER4_SIZE, CHAMFER4_SIZE2_2, e.wrapped, chamfer4_side_2[0].wrapped)  # the first distance lies on this face
    for e in chamfer4_edges_3:
        chamfer4.Add(CHAMFER4_SIZE, CHAMFER4_SIZE2, e.wrapped, chamfer4_side_3[0].wrapped)  # the first distance lies on this face
    for e in chamfer4_edges_4:
        chamfer4.Add(CHAMFER4_SIZE, CHAMFER4_SIZE2_2, e.wrapped, chamfer4_side_4[0].wrapped)  # the first distance lies on this face
    add(Compound.cast(chamfer4.Shape()), mode=Mode.REPLACE)

    # Chamfer5
    chamfer5_edges = [body_7.edges().sort_by_distance(p)[0] for p in [
        (-51.000000108, 136.265000012, 3.675000016),
        (0, 136.265000012, 0),
        (51.000000108, 136.265000012, 3.675000016),
    ]]
    chamfer5_side = [body_7.faces().sort_by_distance(p)[0] for p in [
        (0, 136.265000012, -12.152621986),
    ]]
    chamfer(chamfer5_edges, length=CHAMFER5_SIZE, length2=CHAMFER5_SIZE2, reference=chamfer5_side[0])

    # Chamfer6
    chamfer6_edges = [body_7.edges().sort_by_distance(p)[0] for p in [
        (50.000000044, 136.265000012, 7.350000032),
        (-50.000000044, 136.265000012, 7.350000032),
    ]]
    chamfer6_side = [body_7.faces().sort_by_distance(p)[0] for p in [
        (0, 136.265000012, -13.228753549),
    ]]
    chamfer(chamfer6_edges, length=CHAMFER6_SIZE, length2=CHAMFER6_SIZE2, reference=chamfer6_side[0])

    # Chamfer7
    # the kernel refuses this chamfer: 6.35 mm, written as the material it adds along each edge
    with BuildSketch(Plane(origin=(-54.800000128, 82.290000012, 9.350000096), x_dir=(0, -0.027495876610585654, 0.9996219169112968), z_dir=(1, 0, 0))) as chamfer7_piece_1_section:
        Polygon((CHAMFER7_SIZE * 0.999621916911, -CHAMFER7_SIZE * 0.0274958766106), (-CHAMFER7_SIZE * 0.0274958766106, -CHAMFER7_SIZE * 0.999621916911), (0, 0), align=None)
    chamfer7_piece_1 = extrude(amount=7.800000148, mode=Mode.PRIVATE)
    chamfer7_piece_1 = split(chamfer7_piece_1, bisect_by=Plane(origin=(-50.900000054, 84.583638533, 13.700000032), z_dir=(0, 0, -1)), keep=Keep.TOP, mode=Mode.PRIVATE)
    add(chamfer7_piece_1)
    with BuildSketch(Plane(origin=(46.99999998, 82.290000012, 9.350000096), x_dir=(0, -0.027495876610585654, 0.9996219169112968), z_dir=(1, 0, 0))) as chamfer7_piece_2_section:
        Polygon((CHAMFER7_SIZE * 0.999621916911, -CHAMFER7_SIZE * 0.0274958766106), (-CHAMFER7_SIZE * 0.0274958766106, -CHAMFER7_SIZE * 0.999621916911), (0, 0), align=None)
    chamfer7_piece_2 = extrude(amount=7.800000148, mode=Mode.PRIVATE)
    chamfer7_piece_2 = split(chamfer7_piece_2, bisect_by=Plane(origin=(50.900000054, 84.583638533, 13.700000032), z_dir=(0, 0, -1)), keep=Keep.TOP, mode=Mode.PRIVATE)
    add(chamfer7_piece_2)

    # Sketch22 → Cut-Extrude6 (cut)
    with BuildSketch(Plane(origin=(0, -1.40999972, 0), x_dir=(1, 0, 0), z_dir=(0, 1, 0))):
        with BuildLine():
            Line((-52.00000014, -3.175), (52.00000014, -3.175))
            Line((52.00000014, -3.175), (52.00000014, 2.000000064))
            ThreePointArc((52.00000014, 2.000000064), (51.414213684, 3.414213672), (50.000000076, 4.000000128))
            Line((50.000000076, 4.000000128), (-50.000000076, 4.000000128))
            ThreePointArc((-50.000000076, 4.000000128), (-51.414213684, 3.414213672), (-52.00000014, 2.000000064))
            Line((-52.00000014, 2.000000064), (-52.00000014, -3.175))
        make_face()
    extrude(amount=CUT_EXTRUDE6_DEPTH, mode=Mode.SUBTRACT)


solid = Compound([body_2.part, body_3_2.part, lpattern1_1_2.part, part_6.part, lpattern1_2_2.part, body_7.part])
